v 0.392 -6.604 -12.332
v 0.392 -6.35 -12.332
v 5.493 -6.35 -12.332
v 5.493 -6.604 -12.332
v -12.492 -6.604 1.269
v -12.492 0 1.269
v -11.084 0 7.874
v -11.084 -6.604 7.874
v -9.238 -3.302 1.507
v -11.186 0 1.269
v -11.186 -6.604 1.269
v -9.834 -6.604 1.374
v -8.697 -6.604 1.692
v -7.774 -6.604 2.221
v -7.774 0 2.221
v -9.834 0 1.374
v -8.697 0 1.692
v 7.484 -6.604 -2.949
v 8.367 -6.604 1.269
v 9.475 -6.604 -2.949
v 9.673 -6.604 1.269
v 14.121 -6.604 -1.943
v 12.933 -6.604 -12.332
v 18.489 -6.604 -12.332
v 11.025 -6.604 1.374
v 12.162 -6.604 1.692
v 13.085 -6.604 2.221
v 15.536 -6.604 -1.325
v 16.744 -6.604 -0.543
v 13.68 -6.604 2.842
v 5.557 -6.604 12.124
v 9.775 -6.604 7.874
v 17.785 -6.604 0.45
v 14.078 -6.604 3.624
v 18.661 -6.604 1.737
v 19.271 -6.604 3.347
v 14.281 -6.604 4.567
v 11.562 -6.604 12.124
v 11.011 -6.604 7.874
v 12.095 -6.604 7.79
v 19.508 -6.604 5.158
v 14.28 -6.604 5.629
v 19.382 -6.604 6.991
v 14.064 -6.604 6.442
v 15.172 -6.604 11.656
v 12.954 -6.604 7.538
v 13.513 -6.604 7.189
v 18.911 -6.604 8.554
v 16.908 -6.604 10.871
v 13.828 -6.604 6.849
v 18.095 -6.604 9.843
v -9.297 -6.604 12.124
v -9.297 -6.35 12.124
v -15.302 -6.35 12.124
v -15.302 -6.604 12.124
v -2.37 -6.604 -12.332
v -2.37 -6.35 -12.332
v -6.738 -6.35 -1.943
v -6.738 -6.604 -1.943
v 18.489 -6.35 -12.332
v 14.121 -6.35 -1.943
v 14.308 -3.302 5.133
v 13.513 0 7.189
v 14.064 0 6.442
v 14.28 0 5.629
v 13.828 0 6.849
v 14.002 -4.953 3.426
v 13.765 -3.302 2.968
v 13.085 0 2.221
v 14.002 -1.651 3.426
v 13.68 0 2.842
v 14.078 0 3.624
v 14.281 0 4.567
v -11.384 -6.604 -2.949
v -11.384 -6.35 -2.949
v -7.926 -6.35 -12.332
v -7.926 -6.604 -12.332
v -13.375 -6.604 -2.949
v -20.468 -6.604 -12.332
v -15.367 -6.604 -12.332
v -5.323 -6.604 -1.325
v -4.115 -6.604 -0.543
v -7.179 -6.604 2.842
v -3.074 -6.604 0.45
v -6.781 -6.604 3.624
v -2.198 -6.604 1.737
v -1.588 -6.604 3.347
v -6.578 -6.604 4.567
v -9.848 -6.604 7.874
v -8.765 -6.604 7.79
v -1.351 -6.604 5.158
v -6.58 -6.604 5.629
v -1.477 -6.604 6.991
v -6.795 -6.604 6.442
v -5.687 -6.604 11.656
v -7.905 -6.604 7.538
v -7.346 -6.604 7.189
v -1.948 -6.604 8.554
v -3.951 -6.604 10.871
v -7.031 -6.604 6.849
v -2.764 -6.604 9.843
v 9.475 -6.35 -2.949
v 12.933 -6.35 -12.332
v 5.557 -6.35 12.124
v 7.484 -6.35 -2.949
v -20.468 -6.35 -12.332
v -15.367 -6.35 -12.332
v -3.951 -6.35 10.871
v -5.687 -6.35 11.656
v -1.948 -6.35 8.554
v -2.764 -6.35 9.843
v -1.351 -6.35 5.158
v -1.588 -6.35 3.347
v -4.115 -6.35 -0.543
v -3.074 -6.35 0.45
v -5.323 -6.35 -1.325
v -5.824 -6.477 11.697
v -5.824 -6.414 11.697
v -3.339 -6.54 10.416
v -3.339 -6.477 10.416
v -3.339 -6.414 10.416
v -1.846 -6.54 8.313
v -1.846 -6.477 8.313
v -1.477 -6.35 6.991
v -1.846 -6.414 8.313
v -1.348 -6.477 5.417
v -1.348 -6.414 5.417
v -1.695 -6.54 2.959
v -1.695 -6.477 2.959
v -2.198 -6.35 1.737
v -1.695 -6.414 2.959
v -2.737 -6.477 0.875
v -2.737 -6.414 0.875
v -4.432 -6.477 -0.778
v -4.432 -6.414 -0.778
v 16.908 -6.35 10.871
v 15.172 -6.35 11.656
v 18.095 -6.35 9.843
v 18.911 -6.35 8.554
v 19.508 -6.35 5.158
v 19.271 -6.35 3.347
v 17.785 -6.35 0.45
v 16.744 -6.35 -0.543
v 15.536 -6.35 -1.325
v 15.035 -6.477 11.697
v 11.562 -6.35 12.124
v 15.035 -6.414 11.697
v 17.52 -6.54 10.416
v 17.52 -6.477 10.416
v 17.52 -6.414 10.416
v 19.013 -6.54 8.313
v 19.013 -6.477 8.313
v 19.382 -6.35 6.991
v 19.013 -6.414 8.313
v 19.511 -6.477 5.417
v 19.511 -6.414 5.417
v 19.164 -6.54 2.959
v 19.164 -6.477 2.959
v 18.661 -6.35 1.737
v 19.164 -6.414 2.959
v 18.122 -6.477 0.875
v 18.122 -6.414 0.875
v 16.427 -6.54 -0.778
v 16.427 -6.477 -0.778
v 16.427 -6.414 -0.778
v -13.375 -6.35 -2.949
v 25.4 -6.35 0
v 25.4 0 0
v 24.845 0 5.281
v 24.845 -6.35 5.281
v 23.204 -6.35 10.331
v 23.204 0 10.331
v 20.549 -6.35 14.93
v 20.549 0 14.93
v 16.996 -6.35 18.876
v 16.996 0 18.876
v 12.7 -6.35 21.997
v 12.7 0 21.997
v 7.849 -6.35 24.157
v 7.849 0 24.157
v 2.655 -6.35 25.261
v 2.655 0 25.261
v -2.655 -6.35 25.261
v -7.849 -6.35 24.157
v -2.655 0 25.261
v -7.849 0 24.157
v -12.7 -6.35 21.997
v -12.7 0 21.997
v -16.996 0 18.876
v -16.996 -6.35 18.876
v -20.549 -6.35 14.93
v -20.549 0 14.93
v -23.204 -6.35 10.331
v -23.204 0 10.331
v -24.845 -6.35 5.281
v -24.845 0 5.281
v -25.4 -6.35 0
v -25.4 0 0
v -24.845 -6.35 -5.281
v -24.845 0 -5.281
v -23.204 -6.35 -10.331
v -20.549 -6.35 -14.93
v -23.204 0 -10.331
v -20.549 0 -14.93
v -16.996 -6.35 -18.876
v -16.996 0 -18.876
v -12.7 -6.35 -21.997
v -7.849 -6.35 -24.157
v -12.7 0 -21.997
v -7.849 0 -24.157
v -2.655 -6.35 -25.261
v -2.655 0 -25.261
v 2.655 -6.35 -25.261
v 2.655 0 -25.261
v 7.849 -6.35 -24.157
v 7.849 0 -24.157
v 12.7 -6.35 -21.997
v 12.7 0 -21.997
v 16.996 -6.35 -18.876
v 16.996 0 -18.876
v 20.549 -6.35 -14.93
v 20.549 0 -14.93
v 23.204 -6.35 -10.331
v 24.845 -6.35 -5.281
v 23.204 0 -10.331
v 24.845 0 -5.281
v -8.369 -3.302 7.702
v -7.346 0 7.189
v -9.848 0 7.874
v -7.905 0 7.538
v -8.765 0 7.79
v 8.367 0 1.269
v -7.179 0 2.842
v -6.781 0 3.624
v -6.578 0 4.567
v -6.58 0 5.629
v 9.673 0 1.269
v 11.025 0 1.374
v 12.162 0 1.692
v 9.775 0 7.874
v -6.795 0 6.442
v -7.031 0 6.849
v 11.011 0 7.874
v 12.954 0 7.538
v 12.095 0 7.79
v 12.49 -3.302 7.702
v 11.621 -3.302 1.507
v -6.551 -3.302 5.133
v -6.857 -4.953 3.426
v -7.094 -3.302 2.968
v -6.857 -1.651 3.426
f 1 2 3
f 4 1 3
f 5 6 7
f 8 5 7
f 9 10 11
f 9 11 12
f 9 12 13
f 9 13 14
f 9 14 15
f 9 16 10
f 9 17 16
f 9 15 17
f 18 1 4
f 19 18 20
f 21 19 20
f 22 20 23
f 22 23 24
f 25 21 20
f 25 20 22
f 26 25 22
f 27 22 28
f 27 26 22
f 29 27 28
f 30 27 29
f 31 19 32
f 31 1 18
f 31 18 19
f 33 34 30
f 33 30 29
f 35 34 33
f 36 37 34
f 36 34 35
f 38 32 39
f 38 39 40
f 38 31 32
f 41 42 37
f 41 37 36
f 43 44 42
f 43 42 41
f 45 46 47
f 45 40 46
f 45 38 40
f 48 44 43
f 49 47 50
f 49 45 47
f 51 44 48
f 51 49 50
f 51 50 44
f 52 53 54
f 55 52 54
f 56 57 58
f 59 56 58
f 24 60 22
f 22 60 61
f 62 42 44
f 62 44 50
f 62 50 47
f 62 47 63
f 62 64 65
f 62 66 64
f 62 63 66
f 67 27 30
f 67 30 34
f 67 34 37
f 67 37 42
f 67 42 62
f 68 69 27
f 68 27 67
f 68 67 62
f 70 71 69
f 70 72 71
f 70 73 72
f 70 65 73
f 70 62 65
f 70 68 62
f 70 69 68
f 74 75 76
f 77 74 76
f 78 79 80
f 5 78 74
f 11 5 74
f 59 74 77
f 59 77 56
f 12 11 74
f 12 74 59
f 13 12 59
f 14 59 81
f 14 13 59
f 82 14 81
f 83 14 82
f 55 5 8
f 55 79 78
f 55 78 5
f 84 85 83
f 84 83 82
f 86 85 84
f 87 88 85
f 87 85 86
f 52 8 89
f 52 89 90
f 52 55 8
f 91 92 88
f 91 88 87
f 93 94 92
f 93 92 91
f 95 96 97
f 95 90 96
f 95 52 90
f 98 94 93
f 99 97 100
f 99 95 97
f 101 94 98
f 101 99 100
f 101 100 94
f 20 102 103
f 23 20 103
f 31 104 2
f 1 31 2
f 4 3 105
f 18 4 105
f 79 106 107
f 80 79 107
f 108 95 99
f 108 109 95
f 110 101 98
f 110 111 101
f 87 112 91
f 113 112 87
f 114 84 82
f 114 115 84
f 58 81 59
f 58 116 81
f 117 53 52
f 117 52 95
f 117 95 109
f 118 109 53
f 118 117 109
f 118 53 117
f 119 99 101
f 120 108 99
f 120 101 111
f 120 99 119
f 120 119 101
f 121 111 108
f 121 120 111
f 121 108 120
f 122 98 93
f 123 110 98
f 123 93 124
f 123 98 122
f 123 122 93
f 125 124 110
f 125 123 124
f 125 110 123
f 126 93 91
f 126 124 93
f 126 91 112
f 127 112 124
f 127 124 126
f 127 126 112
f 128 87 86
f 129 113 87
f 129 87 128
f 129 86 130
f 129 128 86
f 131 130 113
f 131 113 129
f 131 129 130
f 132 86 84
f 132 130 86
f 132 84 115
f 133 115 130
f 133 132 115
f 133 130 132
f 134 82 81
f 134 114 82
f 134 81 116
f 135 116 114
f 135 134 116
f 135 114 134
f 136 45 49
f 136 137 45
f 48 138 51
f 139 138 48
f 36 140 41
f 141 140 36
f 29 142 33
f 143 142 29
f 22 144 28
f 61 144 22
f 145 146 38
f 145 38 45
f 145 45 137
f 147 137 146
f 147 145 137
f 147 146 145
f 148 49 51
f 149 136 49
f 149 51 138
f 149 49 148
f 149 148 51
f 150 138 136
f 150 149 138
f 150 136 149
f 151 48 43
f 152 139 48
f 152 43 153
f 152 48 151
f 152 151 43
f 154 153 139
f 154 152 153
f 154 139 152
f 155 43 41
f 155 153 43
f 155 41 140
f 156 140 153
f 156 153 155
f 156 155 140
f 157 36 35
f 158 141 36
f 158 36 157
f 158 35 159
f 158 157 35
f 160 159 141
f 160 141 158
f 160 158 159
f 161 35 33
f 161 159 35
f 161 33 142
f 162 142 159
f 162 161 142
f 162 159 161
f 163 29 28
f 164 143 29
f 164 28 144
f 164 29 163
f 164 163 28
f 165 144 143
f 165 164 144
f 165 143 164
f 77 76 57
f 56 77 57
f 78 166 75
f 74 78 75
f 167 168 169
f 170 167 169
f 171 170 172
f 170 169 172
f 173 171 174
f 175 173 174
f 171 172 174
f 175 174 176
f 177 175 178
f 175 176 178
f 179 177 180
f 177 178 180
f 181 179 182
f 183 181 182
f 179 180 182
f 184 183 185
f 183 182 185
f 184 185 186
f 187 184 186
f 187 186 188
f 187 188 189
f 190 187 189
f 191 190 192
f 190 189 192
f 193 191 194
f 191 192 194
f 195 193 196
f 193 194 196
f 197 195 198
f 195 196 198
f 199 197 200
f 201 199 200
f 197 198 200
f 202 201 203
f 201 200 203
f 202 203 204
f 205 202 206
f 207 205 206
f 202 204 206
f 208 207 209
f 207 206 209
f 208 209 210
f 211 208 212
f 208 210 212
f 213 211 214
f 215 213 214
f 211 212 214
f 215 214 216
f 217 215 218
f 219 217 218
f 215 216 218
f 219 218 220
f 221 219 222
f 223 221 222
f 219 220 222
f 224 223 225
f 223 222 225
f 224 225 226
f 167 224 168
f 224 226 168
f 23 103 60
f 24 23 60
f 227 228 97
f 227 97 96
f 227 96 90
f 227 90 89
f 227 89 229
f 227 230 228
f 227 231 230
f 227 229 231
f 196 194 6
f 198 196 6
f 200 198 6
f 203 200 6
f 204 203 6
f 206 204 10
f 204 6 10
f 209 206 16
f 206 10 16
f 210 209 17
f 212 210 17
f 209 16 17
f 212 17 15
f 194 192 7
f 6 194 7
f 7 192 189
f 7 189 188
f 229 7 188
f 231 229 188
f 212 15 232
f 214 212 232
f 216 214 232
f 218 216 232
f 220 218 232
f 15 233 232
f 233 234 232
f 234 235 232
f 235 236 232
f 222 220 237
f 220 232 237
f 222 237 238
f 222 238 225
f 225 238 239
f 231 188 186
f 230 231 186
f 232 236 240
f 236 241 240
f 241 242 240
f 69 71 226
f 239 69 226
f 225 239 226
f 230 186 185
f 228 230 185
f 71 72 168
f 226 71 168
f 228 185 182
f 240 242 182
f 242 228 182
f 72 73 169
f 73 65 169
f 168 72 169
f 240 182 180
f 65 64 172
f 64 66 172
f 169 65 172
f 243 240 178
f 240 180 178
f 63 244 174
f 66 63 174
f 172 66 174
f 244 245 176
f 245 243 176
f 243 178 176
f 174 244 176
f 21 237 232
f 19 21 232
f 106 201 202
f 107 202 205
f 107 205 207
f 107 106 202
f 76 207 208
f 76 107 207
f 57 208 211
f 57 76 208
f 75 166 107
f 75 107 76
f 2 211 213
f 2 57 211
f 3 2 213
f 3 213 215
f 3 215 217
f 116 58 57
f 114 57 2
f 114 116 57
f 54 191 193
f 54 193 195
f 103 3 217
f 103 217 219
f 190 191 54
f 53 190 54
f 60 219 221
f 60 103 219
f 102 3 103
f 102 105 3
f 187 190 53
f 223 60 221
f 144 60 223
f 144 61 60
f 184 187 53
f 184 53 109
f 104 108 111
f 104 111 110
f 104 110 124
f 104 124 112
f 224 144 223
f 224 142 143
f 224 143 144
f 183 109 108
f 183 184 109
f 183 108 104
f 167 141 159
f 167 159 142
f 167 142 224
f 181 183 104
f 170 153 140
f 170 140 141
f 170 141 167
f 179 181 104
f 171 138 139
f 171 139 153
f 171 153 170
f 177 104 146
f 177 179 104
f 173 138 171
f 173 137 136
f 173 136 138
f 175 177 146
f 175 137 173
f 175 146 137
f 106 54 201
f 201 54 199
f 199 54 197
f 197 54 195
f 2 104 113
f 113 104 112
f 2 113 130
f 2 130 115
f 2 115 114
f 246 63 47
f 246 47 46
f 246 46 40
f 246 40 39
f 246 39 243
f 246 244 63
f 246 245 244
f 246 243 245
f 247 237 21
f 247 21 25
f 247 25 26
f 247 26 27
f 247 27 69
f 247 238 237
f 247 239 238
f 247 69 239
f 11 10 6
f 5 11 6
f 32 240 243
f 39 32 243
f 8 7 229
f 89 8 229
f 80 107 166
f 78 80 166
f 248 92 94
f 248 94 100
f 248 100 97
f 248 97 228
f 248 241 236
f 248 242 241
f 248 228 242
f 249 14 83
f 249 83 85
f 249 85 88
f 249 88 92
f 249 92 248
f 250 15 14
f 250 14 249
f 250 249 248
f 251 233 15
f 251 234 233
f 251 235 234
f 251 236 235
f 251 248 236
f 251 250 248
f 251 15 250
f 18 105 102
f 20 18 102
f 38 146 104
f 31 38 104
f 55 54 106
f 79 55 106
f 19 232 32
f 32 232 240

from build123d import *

# Parameters (mm, degrees)
F0_R     = 25.4
F1_DEPTH = 6.35
F3_DEPTH = 6.604
F4_DEPTH = 6.604


# Not quite as in the source:
# - the program builds the solid bodies; features that only make, move or delete a surface that nothing else refers to are left out


with BuildPart() as f1:
    # F0 (on Front) → F1 (new body)
    with BuildSketch(Plane.XZ):
        Circle(F0_R)
        with BuildLine():
            Line((-11.384175581, -2.9492764653), (-13.375339268, -2.9492764653))
            Line((-13.375339268, -2.9492764653), (-15.3665029551, -12.3323677108))
            Line((-15.3665029551, -12.3323677108), (-20.4675217554, -12.3323677108))
            Line((-20.4675217554, -12.3323677108), (-15.3022718684, 12.1236185417))
            Line((-15.3022718684, 12.1236185417), (-9.296665264, 12.1236185417))
            add(Edge.make_bspline(
                [(-9.296665264, 12.1236185417), (-5.3303956617, 12.1236185417), (-3.3392319747, 10.4161421542)],
                knots=[0, 0, 0, 1, 1, 1], degree=2))
            add(Edge.make_bspline(
                [(-3.3392319747, 10.4161421542), (-1.3480682877, 8.7086657667), (-1.3480682877, 5.4168225745)],
                knots=[0, 0, 0, 1, 1, 1], degree=2))
            add(Edge.make_bspline(
                [(-1.3480682877, 5.4168225745), (-1.3480682877, 2.7726428396), (-2.7370655371, 0.8751494873)],
                knots=[0, 0, 0, 1, 1, 1], degree=2))
            add(Edge.make_bspline(
                [(-2.7370655371, 0.8751494873), (-4.1260627865, -1.022343865), (-6.738126978, -1.9429894407)],
                knots=[0, 0, 0, 1, 1, 1], degree=2))
            Line((-6.738126978, -1.9429894407), (-2.370413084, -12.3323677108))
            Line((-2.370413084, -12.3323677108), (-7.9264020816, -12.3323677108))
            Line((-7.9264020816, -12.3323677108), (-11.384175581, -2.9492764653))
        make_face(mode=Mode.SUBTRACT)
        with BuildLine():
            Line((9.4748698175, -2.9492764653), (7.4837061305, -2.9492764653))
            Line((7.4837061305, -2.9492764653), (5.4925424435, -12.3323677108))
            Line((5.4925424435, -12.3323677108), (0.3915236432, -12.3323677108))
            Line((0.3915236432, -12.3323677108), (5.5567735302, 12.1236185417))
            Line((5.5567735302, 12.1236185417), (11.5623801345, 12.1236185417))
            add(Edge.make_bspline(
                [(11.5623801345, 12.1236185417), (15.5286497369, 12.1236185417), (17.5198134239, 10.4161421542)],
                knots=[0, 0, 0, 1, 1, 1], degree=2))
            add(Edge.make_bspline(
                [(17.5198134239, 10.4161421542), (19.5109771109, 8.7086657667), (19.5109771109, 5.4168225745)],
                knots=[0, 0, 0, 1, 1, 1], degree=2))
            add(Edge.make_bspline(
                [(19.5109771109, 5.4168225745), (19.5109771109, 2.7726428396), (18.1219798615, 0.8751494873)],
                knots=[0, 0, 0, 1, 1, 1], degree=2))
            add(Edge.make_bspline(
                [(18.1219798615, 0.8751494873), (16.7329826121, -1.022343865), (14.1209184205, -1.9429894407)],
                knots=[0, 0, 0, 1, 1, 1], degree=2))
            Line((14.1209184205, -1.9429894407), (18.4886323146, -12.3323677108))
            Line((18.4886323146, -12.3323677108), (12.932643317, -12.3323677108))
            Line((12.932643317, -12.3323677108), (9.4748698175, -2.9492764653))
        make_face(mode=Mode.SUBTRACT)
    extrude(amount=F1_DEPTH)

    # F0 (on Front) → F3 (join)
    with BuildSketch(Plane.XZ):
        with BuildLine():
            Line((5.4925424435, -12.3323677108), (7.4837061305, -2.9492764653))
            Line((7.4837061305, -2.9492764653), (9.4748698175, -2.9492764653))
            Line((9.4748698175, -2.9492764653), (12.932643317, -12.3323677108))
            Line((12.932643317, -12.3323677108), (18.4886323146, -12.3323677108))
            Line((18.4886323146, -12.3323677108), (14.1209184205, -1.9429894407))
            add(Edge.make_bspline(
                [(18.1219798615, 0.8751494873), (16.7329826121, -1.022343865), (14.1209184205, -1.9429894407)],
                knots=[0, 0, 0, 1, 1, 1], degree=2))
            add(Edge.make_bspline(
                [(19.5109771109, 5.4168225745), (19.5109771109, 2.7726428396), (18.1219798615, 0.8751494873)],
                knots=[0, 0, 0, 1, 1, 1], degree=2))
            add(Edge.make_bspline(
                [(17.5198134239, 10.4161421542), (19.5109771109, 8.7086657667), (19.5109771109, 5.4168225745)],
                knots=[0, 0, 0, 1, 1, 1], degree=2))
            add(Edge.make_bspline(
                [(11.5623801345, 12.1236185417), (15.5286497369, 12.1236185417), (17.5198134239, 10.4161421542)],
                knots=[0, 0, 0, 1, 1, 1], degree=2))
            Line((11.5623801345, 12.1236185417), (5.5567735302, 12.1236185417))
            Line((5.5567735302, 12.1236185417), (0.3915236432, -12.3323677108))
            Line((0.3915236432, -12.3323677108), (5.4925424435, -12.3323677108))
        make_face()
        with BuildLine():
            Line((9.6729156681, 1.2685648932), (8.3668835723, 1.2685648932))
            Line((8.3668835723, 1.2685648932), (9.7746148887, 7.8736616399))
            Line((9.7746148887, 7.8736616399), (11.0110633072, 7.8736616399))
            add(Edge.make_bspline(
                [(13.5133993923, 7.1885300487), (12.7185396947, 7.8736616399), (11.0110633072, 7.8736616399)],
                knots=[0, 0, 0, 1, 1, 1], degree=2))
            add(Edge.make_bspline(
                [(14.30825909, 5.133135275), (14.30825909, 6.5033984574), (13.5133993923, 7.1885300487)],
                knots=[0, 0, 0, 1, 1, 1], degree=2))
            add(Edge.make_bspline(
                [(13.0851921478, 2.2213260123), (14.30825909, 3.1740871313), (14.30825909, 5.133135275)],
                knots=[0, 0, 0, 1, 1, 1], degree=2))
            add(Edge.make_bspline(
                [(9.6729156681, 1.2685648932), (11.8621252057, 1.2685648932), (13.0851921478, 2.2213260123)],
                knots=[0, 0, 0, 1, 1, 1], degree=2))
        make_face(mode=Mode.SUBTRACT)
    extrude(amount=F3_DEPTH)

    # F0 (on Front) → F4 (join)
    with BuildSketch(Plane.XZ):
        with BuildLine():
            Line((-15.3665029551, -12.3323677108), (-13.375339268, -2.9492764653))
            Line((-13.375339268, -2.9492764653), (-11.384175581, -2.9492764653))
            Line((-11.384175581, -2.9492764653), (-7.9264020816, -12.3323677108))
            Line((-7.9264020816, -12.3323677108), (-2.370413084, -12.3323677108))
            Line((-2.370413084, -12.3323677108), (-6.738126978, -1.9429894407))
            add(Edge.make_bspline(
                [(-2.7370655371, 0.8751494873), (-4.1260627865, -1.022343865), (-6.738126978, -1.9429894407)],
                knots=[0, 0, 0, 1, 1, 1], degree=2))
            add(Edge.make_bspline(
                [(-1.3480682877, 5.4168225745), (-1.3480682877, 2.7726428396), (-2.7370655371, 0.8751494873)],
                knots=[0, 0, 0, 1, 1, 1], degree=2))
            add(Edge.make_bspline(
                [(-3.3392319747, 10.4161421542), (-1.3480682877, 8.7086657667), (-1.3480682877, 5.4168225745)],
                knots=[0, 0, 0, 1, 1, 1], degree=2))
            add(Edge.make_bspline(
                [(-9.296665264, 12.1236185417), (-5.3303956617, 12.1236185417), (-3.3392319747, 10.4161421542)],
                knots=[0, 0, 0, 1, 1, 1], degree=2))
            Line((-9.296665264, 12.1236185417), (-15.3022718684, 12.1236185417))
            Line((-15.3022718684, 12.1236185417), (-20.4675217554, -12.3323677108))
            Line((-20.4675217554, -12.3323677108), (-15.3665029551, -12.3323677108))
        make_face()
        with BuildLine():
            Line((-11.1861297305, 1.2685648932), (-12.4921618262, 1.2685648932))
            Line((-12.4921618262, 1.2685648932), (-11.0844305099, 7.8736616399))
            Line((-11.0844305099, 7.8736616399), (-9.8479820913, 7.8736616399))
            add(Edge.make_bspline(
                [(-7.3456460062, 7.1885300487), (-8.1405057038, 7.8736616399), (-9.8479820913, 7.8736616399)],
                knots=[0, 0, 0, 1, 1, 1], degree=2))
            add(Edge.make_bspline(
                [(-6.5507863086, 5.133135275), (-6.5507863086, 6.5033984574), (-7.3456460062, 7.1885300487)],
                knots=[0, 0, 0, 1, 1, 1], degree=2))
            add(Edge.make_bspline(
                [(-7.7738532507, 2.2213260123), (-6.5507863086, 3.1740871313), (-6.5507863086, 5.133135275)],
                knots=[0, 0, 0, 1, 1, 1], degree=2))
            add(Edge.make_bspline(
                [(-11.1861297305, 1.2685648932), (-8.9969201929, 1.2685648932), (-7.7738532507, 2.2213260123)],
                knots=[0, 0, 0, 1, 1, 1], degree=2))
        make_face(mode=Mode.SUBTRACT)
    extrude(amount=F4_DEPTH)


solid = f1.part
